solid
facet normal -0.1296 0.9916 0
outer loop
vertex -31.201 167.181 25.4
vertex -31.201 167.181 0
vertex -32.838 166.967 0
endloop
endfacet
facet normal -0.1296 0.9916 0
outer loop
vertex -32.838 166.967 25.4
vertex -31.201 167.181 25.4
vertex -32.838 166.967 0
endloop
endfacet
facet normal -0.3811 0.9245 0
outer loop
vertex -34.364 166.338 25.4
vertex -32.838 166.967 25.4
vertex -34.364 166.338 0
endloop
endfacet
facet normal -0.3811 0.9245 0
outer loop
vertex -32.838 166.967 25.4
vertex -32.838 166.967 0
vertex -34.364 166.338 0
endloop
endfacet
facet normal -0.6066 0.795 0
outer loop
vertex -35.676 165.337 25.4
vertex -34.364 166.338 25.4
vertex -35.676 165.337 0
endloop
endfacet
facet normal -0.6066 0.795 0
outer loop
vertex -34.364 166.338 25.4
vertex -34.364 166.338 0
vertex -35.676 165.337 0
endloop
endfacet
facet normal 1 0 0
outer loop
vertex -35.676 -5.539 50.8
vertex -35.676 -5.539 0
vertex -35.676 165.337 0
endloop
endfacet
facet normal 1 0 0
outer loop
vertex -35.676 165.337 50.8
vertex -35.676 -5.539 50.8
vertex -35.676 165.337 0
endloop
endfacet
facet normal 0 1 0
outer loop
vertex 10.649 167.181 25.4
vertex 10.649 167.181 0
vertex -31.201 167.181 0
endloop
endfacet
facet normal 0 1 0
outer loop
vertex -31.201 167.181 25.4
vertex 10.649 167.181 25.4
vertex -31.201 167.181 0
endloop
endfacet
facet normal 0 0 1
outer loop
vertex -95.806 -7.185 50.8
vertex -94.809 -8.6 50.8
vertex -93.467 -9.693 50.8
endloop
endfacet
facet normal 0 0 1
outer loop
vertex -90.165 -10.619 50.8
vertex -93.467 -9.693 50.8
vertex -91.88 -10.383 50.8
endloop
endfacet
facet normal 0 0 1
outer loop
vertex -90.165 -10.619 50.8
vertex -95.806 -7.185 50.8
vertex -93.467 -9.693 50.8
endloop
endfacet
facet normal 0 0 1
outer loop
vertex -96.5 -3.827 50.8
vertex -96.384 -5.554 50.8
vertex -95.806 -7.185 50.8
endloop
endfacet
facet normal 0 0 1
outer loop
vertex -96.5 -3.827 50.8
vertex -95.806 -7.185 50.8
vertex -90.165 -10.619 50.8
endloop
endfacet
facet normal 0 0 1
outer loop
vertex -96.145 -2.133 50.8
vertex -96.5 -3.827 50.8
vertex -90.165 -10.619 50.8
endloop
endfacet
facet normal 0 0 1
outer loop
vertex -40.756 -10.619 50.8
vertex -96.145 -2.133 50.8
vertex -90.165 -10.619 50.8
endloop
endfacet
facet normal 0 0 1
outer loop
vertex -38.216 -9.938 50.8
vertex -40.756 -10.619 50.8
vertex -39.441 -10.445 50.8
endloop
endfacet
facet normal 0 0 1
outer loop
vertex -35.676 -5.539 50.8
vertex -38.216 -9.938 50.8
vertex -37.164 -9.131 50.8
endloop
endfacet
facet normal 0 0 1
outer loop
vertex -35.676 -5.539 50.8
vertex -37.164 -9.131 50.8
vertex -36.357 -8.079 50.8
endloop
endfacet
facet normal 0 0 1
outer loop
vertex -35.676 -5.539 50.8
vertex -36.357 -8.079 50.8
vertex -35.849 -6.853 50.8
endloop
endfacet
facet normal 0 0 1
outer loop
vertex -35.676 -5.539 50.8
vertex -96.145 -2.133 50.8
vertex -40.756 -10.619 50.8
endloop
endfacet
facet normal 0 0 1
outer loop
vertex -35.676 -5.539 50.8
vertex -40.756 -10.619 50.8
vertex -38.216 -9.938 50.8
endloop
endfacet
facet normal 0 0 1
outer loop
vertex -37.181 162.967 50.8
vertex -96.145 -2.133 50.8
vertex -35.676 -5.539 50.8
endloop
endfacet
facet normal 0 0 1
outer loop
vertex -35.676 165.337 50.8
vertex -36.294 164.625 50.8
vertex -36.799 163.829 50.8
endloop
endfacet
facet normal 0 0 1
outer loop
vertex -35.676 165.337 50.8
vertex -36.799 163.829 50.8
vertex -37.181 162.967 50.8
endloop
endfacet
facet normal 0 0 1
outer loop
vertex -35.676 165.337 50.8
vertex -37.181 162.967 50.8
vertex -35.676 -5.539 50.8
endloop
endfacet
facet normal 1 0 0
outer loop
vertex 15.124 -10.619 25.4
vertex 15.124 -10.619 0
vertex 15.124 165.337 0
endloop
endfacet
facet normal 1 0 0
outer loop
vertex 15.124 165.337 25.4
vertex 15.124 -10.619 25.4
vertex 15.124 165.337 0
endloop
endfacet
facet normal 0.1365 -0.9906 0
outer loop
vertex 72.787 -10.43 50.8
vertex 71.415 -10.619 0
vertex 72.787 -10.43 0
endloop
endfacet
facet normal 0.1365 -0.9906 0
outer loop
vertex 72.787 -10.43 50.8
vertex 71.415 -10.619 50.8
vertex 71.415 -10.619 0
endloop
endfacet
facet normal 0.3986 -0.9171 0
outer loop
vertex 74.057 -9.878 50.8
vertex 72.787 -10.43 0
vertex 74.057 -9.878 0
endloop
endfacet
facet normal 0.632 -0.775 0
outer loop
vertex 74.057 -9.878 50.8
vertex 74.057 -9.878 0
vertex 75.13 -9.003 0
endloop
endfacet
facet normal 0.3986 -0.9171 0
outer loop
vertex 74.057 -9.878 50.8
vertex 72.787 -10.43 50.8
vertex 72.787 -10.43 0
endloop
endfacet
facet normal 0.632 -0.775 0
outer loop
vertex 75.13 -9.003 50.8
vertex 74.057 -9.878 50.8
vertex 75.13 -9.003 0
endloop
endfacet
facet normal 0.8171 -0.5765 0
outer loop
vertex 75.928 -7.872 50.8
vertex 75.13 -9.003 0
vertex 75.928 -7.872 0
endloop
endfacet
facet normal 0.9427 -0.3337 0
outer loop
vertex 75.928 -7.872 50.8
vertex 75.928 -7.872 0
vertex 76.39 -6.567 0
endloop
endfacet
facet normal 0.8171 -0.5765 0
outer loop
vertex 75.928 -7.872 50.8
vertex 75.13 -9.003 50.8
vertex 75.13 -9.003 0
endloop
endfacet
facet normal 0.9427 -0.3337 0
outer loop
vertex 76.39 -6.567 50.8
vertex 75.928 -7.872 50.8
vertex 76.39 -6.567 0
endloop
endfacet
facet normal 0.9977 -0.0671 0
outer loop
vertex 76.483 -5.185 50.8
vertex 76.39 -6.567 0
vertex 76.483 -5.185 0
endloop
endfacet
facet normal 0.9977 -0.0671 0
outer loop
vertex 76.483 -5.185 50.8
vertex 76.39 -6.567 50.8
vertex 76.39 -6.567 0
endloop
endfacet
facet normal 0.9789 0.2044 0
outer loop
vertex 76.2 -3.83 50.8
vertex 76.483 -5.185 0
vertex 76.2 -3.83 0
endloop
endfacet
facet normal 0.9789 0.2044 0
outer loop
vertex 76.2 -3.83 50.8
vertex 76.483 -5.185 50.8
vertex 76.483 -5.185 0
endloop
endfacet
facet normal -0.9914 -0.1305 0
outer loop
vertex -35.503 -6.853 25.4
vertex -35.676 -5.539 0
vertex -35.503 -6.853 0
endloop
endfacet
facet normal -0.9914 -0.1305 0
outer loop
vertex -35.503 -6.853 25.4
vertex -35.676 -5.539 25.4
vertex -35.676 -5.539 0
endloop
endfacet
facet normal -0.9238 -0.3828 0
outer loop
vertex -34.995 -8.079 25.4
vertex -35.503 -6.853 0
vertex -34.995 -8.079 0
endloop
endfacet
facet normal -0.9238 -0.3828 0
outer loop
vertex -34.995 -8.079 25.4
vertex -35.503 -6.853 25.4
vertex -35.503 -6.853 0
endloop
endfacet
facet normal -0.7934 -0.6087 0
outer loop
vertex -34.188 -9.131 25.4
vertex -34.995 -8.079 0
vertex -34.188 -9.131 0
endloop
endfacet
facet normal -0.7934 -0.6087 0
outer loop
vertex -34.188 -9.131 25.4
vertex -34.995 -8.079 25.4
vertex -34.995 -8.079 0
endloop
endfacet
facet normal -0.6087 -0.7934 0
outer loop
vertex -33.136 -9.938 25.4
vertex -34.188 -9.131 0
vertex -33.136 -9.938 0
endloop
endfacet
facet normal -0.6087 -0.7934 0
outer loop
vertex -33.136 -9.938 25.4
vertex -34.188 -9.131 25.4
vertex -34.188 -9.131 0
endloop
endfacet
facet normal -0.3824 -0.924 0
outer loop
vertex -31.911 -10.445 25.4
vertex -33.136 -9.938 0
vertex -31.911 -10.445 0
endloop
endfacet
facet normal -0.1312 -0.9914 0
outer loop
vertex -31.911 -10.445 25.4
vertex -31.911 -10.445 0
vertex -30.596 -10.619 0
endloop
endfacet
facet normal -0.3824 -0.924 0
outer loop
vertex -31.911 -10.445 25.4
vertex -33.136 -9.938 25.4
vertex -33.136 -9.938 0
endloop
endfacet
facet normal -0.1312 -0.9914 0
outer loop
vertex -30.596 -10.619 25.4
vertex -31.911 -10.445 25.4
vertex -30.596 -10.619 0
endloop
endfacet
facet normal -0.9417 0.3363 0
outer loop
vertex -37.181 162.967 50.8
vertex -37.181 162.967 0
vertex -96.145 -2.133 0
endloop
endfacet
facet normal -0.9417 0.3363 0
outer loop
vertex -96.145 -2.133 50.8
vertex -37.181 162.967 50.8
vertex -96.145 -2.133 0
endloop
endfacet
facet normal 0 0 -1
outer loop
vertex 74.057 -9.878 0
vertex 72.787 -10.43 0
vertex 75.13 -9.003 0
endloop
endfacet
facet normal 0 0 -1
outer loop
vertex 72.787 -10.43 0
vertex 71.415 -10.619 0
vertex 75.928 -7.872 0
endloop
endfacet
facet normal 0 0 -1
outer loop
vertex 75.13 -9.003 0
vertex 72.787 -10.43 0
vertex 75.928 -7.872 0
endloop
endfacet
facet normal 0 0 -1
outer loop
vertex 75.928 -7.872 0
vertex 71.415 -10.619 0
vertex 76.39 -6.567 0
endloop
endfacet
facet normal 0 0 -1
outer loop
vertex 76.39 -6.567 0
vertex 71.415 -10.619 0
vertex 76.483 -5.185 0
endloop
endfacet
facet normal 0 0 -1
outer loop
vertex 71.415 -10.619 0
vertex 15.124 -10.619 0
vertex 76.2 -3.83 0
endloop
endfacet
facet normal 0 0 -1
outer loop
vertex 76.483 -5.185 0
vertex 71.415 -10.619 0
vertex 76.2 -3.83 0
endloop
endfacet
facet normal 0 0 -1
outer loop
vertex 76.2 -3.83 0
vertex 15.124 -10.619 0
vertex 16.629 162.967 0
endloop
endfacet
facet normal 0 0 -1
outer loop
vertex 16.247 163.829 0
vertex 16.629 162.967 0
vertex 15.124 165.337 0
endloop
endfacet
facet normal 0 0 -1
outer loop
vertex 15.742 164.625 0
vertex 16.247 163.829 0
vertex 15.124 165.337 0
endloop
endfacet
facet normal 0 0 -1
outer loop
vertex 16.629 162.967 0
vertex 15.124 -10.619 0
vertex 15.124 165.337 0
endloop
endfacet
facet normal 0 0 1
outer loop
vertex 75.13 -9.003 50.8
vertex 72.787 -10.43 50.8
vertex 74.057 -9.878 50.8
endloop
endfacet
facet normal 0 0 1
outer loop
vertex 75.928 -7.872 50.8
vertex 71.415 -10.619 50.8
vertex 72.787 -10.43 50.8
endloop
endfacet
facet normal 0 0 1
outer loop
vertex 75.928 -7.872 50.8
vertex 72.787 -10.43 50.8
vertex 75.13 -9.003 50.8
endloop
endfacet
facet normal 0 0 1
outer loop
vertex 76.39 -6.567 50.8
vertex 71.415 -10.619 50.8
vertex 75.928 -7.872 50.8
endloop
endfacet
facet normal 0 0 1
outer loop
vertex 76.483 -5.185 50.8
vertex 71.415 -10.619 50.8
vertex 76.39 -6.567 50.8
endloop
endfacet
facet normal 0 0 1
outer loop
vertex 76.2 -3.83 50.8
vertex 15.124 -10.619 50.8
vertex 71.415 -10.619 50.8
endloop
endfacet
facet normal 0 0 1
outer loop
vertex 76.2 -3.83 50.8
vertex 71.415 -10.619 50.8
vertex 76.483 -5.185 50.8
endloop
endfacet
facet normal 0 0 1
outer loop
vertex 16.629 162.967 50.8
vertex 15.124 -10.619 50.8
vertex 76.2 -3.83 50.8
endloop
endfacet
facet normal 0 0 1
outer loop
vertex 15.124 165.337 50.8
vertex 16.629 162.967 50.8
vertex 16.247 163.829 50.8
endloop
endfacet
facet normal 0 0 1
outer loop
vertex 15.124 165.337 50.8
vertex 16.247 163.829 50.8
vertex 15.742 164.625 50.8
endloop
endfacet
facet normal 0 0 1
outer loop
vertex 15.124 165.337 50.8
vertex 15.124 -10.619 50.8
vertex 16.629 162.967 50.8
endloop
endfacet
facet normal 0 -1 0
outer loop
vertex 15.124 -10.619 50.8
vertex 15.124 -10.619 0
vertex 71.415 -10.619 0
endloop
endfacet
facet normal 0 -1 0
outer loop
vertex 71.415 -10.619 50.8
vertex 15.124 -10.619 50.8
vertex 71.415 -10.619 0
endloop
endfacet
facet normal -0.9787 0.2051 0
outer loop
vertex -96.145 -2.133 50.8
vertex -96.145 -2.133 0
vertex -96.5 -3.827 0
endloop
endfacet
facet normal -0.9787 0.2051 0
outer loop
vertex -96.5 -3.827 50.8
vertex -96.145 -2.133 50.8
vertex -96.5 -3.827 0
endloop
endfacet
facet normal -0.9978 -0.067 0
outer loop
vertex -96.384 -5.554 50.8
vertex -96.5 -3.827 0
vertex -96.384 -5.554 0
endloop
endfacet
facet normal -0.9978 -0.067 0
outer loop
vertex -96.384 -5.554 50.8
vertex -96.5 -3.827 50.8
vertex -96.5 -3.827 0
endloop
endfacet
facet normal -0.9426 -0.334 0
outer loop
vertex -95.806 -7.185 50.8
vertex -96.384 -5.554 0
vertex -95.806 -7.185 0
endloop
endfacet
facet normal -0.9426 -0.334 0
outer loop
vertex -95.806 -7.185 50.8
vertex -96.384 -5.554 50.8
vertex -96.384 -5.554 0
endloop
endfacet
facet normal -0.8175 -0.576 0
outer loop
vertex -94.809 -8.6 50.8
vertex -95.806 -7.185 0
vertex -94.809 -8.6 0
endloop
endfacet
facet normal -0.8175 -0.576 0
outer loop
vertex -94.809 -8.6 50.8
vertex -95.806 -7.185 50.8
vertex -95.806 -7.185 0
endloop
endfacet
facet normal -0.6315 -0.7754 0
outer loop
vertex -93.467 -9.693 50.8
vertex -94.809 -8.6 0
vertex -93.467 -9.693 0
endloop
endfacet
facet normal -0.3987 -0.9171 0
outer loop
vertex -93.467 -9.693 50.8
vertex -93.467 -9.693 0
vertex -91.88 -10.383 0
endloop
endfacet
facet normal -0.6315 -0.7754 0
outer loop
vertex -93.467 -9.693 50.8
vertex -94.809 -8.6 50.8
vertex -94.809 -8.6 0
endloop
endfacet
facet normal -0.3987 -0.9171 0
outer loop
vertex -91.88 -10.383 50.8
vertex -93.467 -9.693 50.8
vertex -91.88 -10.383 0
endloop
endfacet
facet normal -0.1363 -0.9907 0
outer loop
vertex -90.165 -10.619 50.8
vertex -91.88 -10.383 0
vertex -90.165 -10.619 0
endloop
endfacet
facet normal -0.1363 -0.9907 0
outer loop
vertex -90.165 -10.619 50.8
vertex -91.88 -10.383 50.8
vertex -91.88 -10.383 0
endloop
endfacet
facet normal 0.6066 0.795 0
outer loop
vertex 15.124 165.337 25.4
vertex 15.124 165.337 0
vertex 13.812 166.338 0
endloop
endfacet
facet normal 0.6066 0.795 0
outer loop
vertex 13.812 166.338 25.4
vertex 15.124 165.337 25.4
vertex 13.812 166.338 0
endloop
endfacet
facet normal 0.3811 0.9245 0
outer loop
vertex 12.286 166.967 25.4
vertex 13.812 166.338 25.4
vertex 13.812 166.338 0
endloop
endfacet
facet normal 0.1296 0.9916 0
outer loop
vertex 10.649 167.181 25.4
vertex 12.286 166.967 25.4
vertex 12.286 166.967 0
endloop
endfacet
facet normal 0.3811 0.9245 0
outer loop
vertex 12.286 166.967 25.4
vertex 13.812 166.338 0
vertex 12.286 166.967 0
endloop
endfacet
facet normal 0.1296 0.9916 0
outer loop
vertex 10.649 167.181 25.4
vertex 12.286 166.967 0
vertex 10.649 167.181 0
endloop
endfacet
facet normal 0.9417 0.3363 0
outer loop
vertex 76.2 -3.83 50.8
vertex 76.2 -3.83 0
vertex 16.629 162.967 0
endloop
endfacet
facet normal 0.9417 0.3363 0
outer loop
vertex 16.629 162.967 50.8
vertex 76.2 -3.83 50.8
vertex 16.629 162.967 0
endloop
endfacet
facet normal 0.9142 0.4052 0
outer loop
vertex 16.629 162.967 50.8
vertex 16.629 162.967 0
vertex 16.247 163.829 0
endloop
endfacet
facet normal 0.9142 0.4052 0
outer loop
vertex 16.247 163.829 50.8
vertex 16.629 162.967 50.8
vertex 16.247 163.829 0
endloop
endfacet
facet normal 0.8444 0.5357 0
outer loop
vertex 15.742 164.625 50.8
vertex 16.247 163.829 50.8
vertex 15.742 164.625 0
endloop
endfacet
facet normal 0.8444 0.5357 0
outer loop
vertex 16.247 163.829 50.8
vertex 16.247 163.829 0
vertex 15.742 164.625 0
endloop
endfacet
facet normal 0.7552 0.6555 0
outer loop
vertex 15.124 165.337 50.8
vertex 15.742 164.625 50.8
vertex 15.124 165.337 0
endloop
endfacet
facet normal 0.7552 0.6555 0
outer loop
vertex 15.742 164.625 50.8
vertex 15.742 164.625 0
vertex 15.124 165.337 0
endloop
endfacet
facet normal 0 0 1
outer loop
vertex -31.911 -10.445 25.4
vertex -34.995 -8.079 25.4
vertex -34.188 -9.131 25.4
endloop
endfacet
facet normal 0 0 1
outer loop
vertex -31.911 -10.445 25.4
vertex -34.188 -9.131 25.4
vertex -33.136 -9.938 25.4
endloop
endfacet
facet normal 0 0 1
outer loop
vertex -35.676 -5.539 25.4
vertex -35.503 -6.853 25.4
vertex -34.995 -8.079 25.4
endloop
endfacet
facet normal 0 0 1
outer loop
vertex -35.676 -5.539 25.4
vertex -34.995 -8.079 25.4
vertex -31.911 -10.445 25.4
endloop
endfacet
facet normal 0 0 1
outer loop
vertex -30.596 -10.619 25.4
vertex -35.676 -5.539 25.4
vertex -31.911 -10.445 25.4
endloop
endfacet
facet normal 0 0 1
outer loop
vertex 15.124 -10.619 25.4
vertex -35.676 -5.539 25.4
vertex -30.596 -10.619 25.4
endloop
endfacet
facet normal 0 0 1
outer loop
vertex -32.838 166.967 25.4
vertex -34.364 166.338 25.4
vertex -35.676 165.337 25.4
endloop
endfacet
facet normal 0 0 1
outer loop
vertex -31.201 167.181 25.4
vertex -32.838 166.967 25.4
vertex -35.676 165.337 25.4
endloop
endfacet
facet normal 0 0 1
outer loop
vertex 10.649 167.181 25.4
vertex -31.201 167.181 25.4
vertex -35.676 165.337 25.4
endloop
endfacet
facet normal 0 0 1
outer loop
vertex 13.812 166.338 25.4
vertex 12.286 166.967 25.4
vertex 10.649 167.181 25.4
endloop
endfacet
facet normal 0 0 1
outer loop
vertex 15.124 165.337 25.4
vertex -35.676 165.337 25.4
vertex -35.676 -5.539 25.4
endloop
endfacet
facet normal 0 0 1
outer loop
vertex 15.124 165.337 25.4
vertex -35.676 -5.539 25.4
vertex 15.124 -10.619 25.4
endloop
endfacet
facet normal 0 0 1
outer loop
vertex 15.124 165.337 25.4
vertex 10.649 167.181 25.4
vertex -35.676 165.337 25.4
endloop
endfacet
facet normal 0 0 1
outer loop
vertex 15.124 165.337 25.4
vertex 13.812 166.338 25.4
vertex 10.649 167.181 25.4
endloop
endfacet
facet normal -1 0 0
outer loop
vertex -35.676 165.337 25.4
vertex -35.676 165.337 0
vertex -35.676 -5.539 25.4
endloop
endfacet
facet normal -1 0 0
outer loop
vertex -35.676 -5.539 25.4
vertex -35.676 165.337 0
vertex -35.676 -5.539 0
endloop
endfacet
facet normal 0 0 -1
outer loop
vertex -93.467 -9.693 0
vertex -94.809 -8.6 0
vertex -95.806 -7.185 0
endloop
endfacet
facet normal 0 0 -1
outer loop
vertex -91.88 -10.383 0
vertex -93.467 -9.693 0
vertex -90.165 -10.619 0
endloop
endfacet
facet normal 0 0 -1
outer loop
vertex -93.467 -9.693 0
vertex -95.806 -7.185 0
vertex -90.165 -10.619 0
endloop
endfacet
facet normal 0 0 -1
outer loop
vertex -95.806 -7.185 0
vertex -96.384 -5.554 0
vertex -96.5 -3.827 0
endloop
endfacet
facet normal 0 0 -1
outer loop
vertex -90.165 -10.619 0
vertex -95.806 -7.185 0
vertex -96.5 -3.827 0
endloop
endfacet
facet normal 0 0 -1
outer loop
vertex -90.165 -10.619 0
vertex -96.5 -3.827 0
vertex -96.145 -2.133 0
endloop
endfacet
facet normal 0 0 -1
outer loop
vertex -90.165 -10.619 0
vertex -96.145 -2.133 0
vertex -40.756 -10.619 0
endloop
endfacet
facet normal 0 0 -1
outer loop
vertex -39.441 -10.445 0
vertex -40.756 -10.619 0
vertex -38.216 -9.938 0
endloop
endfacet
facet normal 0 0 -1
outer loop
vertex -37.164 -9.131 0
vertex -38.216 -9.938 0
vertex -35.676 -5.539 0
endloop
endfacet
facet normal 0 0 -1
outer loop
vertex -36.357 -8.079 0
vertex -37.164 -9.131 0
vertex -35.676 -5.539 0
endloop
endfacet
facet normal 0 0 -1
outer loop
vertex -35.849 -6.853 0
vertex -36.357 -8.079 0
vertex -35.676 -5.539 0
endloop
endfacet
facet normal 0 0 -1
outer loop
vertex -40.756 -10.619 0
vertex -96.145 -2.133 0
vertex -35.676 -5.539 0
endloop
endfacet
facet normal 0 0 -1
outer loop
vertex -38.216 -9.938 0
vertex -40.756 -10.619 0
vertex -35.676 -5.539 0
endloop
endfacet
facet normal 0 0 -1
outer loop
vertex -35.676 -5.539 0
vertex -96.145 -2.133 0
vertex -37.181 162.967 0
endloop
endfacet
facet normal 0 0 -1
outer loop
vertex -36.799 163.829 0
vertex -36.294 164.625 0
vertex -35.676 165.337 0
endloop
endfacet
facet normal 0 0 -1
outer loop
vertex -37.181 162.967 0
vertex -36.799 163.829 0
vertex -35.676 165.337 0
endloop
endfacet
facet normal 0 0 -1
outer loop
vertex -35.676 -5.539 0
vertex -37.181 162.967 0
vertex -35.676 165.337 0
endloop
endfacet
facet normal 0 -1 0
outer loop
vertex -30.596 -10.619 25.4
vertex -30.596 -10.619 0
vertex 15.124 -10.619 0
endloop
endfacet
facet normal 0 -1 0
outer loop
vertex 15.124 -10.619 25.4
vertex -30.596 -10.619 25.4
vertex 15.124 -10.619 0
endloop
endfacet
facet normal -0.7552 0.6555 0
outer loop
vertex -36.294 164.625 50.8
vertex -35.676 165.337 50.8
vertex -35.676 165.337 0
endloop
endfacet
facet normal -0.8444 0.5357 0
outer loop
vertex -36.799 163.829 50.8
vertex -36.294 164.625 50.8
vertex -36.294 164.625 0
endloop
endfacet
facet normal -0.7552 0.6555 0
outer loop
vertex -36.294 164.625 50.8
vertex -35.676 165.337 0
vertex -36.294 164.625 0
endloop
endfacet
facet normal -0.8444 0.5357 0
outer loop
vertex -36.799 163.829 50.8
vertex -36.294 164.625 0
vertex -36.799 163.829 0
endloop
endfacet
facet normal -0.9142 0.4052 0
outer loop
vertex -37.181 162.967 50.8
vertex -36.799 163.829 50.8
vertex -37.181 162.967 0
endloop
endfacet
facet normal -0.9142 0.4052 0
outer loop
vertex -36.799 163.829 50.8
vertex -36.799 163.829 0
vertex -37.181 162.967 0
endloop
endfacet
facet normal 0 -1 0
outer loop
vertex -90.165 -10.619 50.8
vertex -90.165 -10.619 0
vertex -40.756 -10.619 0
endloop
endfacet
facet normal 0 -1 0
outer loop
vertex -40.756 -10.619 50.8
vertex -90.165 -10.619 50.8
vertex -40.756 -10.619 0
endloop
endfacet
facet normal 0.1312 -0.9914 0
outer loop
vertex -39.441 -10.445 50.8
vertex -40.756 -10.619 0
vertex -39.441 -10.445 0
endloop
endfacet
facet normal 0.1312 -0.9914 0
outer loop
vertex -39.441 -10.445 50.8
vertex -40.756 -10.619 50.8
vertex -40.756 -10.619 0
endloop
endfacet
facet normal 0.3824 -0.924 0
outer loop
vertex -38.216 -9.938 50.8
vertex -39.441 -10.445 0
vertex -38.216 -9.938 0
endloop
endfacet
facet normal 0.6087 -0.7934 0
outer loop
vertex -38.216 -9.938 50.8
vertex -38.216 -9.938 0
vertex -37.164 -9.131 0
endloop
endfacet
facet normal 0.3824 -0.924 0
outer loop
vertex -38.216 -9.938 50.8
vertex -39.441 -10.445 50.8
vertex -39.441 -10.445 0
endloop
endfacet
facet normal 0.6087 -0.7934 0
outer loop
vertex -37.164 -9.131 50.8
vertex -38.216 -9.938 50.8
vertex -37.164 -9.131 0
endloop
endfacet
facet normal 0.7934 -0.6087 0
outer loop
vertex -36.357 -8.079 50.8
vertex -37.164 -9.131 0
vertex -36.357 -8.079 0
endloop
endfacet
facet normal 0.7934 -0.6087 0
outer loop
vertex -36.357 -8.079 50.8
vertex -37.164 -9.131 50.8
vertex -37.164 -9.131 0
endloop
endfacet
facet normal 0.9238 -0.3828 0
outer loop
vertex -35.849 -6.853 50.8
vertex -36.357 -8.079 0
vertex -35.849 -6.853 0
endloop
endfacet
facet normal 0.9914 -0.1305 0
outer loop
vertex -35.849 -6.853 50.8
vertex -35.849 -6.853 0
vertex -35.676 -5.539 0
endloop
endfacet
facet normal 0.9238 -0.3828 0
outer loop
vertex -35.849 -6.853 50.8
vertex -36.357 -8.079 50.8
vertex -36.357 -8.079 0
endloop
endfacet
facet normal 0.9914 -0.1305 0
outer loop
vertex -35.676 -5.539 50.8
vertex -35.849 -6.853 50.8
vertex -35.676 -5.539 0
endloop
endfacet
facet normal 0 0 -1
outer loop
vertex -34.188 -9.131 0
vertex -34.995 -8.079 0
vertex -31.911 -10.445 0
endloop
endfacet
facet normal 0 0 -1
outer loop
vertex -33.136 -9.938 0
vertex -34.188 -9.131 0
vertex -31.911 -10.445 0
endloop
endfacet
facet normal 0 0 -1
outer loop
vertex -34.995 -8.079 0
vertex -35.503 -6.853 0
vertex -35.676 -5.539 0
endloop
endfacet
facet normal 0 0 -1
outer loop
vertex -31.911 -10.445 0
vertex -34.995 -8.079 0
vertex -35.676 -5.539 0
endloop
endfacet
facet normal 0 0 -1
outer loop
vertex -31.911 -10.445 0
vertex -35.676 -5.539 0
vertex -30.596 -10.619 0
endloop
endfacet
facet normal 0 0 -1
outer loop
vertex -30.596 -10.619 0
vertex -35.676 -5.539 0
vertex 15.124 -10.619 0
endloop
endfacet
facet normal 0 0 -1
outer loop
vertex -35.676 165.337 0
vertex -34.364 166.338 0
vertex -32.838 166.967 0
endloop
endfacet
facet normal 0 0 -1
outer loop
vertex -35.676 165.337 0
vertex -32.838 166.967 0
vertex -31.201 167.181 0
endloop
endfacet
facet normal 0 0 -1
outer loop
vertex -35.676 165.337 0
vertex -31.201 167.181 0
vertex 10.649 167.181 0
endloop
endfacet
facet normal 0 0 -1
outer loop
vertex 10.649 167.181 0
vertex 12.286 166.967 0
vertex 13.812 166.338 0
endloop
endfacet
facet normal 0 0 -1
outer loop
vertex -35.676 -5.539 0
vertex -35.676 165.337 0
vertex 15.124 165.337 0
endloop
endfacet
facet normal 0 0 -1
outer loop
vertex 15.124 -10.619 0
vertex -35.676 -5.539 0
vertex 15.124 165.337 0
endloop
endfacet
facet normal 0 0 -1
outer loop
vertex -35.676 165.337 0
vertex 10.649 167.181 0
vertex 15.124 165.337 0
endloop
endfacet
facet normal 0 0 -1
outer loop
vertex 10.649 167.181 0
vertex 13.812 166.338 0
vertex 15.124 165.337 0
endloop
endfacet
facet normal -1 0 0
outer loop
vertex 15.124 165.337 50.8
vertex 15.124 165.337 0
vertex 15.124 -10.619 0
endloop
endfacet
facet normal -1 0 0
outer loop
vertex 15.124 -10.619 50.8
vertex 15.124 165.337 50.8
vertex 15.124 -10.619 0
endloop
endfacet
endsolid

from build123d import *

# Parameters (mm, degrees)
F1_DEPTH = 50.8
F2_DEPTH = 25.4
F3_R     = 6.35
F4_R     = 5.08
F5_R     = 5.08
F6_R     = 5.08


with BuildPart() as f1:
    # F0 (on Top) → F1 (new body)
    with BuildSketch(Plane.XY):
        with BuildLine():
            Line((-35.675994, -10.61857), (-35.675994, 165.336669))
            ThreePointArc((-35.675994, 165.336669), (-36.561115, 164.236127), (-37.181088, 162.967166))
            Line((-37.181088, 162.967166), (-99.175994, -10.61857))
            Line((-99.175994, -10.61857), (-35.675994, -10.61857))
        make_face()
        with BuildLine():
            ThreePointArc((16.6291, 162.967166), (16.009126, 164.236127), (15.124006, 165.336669))
            Line((15.124006, 165.336669), (15.124006, -10.61857))
            Line((15.124006, -10.61857), (78.624006, -10.61857))
            Line((78.624006, -10.61857), (16.6291, 162.967166))
        make_face()
    extrude(amount=F1_DEPTH)

    # F3
    f3_edges = [f1.edges().sort_by_distance(p)[0] for p in [
        (-99.175994, -10.61857, 25.4),
    ]]
    fillet(f3_edges, radius=F3_R)

    # F4
    f4_edges = [f1.edges().sort_by_distance(p)[0] for p in [
        (78.624006, -10.61857, 25.4),
    ]]
    fillet(f4_edges, radius=F4_R)

    # F6
    f6_edges = [f1.edges().sort_by_distance(p)[0] for p in [
        (-35.675994, -10.61857, 25.4),
    ]]
    fillet(f6_edges, radius=F6_R)


with BuildPart() as f2:
    # F0 (on Top) → F2 (new body)
    with BuildSketch(Plane.XY):
        with BuildLine():
            Line((10.649039, 167.18143), (-31.201027, 167.18143))
            ThreePointArc((-31.201027, 167.18143), (-33.621176, 166.702153), (-35.675994, 165.336669))
            Line((-35.675994, 165.336669), (-35.675994, -10.61857))
            Line((-35.675994, -10.61857), (15.124006, -10.61857))
            Line((15.124006, -10.61857), (15.124006, 165.336669))
            ThreePointArc((15.124006, 165.336669), (13.069187, 166.702153), (10.649039, 167.18143))
        make_face()
    extrude(amount=F2_DEPTH)

    # F5
    f5_edges = [f2.edges().sort_by_distance(p)[0] for p in [
        (-35.675994, -10.61857, 25.4),
    ]]
    fillet(f5_edges, radius=F5_R)


solid = Compound([f1.part, f2.part])
